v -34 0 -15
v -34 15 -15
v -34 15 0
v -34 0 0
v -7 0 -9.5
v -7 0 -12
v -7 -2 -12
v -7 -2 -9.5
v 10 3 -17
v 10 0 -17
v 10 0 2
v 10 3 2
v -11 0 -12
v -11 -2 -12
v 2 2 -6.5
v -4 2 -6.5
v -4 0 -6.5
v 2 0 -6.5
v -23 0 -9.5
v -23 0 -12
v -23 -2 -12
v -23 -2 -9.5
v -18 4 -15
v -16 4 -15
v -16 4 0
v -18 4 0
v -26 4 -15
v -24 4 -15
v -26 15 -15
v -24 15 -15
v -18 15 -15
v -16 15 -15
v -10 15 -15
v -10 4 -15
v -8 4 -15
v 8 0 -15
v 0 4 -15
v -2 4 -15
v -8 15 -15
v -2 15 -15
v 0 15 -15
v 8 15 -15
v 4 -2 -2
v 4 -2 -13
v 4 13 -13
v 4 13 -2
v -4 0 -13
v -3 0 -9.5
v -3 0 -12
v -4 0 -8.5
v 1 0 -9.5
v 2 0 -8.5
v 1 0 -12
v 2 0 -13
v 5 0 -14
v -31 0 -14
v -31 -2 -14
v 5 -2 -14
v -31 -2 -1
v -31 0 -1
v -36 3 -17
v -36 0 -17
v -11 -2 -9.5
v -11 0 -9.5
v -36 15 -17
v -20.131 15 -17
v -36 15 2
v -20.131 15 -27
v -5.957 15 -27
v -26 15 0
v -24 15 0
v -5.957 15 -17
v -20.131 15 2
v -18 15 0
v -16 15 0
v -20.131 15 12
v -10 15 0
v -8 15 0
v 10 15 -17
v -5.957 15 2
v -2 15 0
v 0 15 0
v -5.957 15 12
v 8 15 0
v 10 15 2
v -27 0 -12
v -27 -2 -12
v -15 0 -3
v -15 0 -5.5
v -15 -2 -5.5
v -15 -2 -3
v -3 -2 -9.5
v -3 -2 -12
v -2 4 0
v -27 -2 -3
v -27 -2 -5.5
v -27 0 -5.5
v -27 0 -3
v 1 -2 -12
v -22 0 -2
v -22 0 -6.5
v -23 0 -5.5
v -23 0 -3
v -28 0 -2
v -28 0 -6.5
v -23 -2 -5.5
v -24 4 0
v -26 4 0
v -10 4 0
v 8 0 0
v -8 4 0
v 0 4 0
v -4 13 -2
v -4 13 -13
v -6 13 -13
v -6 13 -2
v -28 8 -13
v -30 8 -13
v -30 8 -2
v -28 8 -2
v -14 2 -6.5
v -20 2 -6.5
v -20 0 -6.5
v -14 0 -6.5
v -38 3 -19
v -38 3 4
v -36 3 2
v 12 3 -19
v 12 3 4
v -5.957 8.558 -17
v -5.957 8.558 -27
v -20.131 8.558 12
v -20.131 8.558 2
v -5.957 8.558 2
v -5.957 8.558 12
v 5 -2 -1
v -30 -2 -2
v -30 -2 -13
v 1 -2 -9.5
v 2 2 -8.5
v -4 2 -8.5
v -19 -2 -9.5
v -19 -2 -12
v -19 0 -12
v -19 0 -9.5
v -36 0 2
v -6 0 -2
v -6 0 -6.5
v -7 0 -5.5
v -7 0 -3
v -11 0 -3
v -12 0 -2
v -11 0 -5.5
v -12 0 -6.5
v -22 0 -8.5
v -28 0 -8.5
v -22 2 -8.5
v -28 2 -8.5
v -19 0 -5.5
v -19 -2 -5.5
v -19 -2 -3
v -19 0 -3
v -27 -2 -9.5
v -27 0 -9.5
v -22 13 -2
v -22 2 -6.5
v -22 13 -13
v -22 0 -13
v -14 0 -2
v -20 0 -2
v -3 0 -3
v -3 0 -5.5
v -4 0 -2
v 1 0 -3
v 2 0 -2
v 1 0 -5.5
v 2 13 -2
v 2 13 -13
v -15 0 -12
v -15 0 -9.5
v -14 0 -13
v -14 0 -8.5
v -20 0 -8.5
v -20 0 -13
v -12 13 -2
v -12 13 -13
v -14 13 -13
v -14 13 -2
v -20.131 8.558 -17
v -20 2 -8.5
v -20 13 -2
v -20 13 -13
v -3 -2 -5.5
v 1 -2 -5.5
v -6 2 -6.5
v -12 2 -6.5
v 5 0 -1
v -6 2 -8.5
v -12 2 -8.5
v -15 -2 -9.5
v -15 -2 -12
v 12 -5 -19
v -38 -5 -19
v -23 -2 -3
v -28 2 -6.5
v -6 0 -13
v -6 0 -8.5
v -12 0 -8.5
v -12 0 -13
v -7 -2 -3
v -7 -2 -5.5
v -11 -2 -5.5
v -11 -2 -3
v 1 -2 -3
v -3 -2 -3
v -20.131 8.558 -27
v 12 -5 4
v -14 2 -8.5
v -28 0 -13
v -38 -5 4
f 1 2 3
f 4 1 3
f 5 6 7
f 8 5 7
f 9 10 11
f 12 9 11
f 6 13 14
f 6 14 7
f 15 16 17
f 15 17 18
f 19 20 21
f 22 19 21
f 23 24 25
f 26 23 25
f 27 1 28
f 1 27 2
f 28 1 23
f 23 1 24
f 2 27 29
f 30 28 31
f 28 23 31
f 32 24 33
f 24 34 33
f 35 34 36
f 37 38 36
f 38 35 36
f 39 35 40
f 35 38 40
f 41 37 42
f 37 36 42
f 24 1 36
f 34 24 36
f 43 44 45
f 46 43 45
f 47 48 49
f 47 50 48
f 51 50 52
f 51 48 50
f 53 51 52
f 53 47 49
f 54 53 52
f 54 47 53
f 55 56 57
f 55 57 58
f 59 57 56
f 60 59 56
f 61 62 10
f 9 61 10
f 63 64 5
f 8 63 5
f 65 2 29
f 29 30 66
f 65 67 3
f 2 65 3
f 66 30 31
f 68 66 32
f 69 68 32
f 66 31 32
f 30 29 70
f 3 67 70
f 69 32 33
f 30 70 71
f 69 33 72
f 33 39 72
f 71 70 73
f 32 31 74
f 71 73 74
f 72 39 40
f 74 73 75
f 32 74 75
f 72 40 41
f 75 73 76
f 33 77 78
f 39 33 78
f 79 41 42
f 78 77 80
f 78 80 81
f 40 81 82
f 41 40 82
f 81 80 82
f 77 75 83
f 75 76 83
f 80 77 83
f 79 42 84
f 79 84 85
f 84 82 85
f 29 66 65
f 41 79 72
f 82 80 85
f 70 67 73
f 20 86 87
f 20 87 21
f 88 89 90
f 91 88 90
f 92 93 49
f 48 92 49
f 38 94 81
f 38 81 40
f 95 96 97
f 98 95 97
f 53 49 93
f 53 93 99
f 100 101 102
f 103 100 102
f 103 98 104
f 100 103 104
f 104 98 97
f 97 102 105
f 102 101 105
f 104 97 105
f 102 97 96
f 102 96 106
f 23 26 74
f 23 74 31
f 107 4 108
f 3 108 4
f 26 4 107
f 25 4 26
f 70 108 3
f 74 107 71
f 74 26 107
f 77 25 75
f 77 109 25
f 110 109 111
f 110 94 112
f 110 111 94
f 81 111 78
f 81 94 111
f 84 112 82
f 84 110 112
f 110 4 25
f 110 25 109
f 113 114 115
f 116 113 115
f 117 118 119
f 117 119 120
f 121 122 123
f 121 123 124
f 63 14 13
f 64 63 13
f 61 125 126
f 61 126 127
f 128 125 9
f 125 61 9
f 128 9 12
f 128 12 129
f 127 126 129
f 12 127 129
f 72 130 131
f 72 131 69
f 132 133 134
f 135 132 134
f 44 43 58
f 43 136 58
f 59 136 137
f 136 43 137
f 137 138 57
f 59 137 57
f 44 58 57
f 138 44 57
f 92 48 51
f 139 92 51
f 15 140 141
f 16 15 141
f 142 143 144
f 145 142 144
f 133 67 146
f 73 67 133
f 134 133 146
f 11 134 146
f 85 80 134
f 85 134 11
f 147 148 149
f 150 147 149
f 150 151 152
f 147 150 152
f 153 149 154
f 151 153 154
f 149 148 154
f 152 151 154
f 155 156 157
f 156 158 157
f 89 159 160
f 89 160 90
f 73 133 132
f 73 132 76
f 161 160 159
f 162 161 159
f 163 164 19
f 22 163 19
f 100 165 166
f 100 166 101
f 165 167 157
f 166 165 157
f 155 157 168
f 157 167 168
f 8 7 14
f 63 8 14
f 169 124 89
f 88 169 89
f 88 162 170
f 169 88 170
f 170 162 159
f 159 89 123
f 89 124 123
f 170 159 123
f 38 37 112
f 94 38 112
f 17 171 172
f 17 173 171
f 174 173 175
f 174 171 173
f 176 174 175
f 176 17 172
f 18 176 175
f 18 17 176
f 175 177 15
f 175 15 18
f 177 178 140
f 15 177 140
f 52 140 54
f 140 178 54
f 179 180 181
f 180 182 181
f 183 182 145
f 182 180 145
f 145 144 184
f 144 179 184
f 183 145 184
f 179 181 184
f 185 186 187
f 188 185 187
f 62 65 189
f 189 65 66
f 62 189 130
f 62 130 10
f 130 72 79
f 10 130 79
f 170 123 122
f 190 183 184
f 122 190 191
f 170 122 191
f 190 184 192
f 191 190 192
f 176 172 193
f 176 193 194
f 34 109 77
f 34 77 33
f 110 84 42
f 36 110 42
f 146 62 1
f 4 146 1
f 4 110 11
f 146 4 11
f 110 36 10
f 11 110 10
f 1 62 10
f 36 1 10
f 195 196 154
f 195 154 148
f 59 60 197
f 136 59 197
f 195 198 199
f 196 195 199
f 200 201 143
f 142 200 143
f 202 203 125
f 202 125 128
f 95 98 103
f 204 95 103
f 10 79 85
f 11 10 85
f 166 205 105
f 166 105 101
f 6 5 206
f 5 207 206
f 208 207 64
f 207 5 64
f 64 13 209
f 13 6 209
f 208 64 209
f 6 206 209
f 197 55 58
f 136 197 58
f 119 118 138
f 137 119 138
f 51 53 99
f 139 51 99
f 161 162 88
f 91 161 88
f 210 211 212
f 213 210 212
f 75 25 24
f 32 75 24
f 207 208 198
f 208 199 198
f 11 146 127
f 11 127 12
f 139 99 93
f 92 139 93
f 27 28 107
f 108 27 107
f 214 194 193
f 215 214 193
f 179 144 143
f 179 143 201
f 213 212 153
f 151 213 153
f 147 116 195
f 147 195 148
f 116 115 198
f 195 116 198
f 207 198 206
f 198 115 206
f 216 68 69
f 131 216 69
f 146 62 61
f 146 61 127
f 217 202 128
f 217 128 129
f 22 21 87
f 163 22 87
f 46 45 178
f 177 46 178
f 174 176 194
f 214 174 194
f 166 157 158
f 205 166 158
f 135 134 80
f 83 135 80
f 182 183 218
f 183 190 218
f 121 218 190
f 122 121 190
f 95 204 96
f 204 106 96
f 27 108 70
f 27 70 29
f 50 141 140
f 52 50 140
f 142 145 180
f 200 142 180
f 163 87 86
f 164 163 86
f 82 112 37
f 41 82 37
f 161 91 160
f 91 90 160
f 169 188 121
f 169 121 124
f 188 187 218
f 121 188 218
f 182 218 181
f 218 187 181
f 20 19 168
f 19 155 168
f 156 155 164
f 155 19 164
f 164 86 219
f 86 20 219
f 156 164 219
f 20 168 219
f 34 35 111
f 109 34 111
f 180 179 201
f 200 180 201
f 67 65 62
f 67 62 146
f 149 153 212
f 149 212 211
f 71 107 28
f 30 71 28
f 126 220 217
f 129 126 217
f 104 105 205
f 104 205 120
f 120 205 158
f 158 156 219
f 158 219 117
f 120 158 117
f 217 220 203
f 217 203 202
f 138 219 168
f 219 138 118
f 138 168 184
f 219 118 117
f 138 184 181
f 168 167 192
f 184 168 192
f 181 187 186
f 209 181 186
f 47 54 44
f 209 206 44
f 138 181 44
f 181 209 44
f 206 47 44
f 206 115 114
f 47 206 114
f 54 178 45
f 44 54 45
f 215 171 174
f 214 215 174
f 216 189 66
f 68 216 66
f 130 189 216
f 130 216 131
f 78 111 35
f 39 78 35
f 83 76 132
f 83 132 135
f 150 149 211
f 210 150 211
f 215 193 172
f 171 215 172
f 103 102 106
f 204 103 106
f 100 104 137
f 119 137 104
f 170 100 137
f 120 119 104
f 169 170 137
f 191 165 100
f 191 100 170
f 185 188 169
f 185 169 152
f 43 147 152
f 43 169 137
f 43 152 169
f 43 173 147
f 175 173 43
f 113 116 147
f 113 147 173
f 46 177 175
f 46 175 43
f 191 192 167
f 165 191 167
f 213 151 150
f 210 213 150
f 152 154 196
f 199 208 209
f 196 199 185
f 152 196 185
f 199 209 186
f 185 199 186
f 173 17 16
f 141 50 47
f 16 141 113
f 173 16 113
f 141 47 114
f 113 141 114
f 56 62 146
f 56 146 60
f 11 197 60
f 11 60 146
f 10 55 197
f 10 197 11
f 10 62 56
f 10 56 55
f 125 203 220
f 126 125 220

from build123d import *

# Parameters (mm, degrees)
SKETCH1_W                 = 6
SKETCH1_H                 = 15
BOSS_EXTRUDE1_DEPTH       = 15
SKETCH2_W                 = 2
SKETCH2_H                 = 11
CUT_EXTRUDE1_DEPTH        = 13
SKETCH3_W                 = 15
SKETCH3_H                 = 4
BOSS_EXTRUDE2_DEPTH       = 2
LPATTERN1_COUNT           = 5
LPATTERN1_PITCH           = 8
SKETCH6_W                 = 15
SKETCH6_H                 = 15
BOSS_EXTRUDE4_DEPTH       = 2
SKETCH8_W                 = 15
SKETCH8_H                 = 11
BOSS_EXTRUDE5_DEPTH       = 2
SKETCH9_W                 = 34
SKETCH9_H                 = 2
CUT_EXTRUDE2_DEPTH        = 2
SKETCH13_W                = 36
SKETCH13_H                = 13
SKETCH13_W_2              = 34
SKETCH13_H_2              = 11
BOSS_EXTRUDE9_DEPTH       = 2
SKETCH15_W                = 4
SKETCH15_H                = 2.5
BOSS_EXTRUDE10_DEPTH      = 2
LPATTERN2_COUNT           = 4
LPATTERN2_PITCH           = 8
BOSS_EXTRUDE11_DEPTH      = 5
BOSS_EXTRUDE11_DEPTH_BACK = 15
SKETCH17_W                = 46
SKETCH17_H                = 19
SPLIT2_START              = -5
SPLIT2_OUTLINE_W          = 46
SPLIT2_OUTLINE_H          = 19
SPLIT2_DEPTH              = 5
SPLIT2_2_OUTLINE_W        = 2
SPLIT2_2_OUTLINE_H        = 11
SPLIT2_2_DEPTH            = 13
SPLIT2_3_OUTLINE_W        = 6
SPLIT2_3_OUTLINE_H        = 2
SPLIT2_3_DEPTH            = 2
SPLIT2_START_2            = -13
SPLIT2_4_DEPTH            = 11
SPLIT2_START_3            = -17
SPLIT2_5_DEPTH            = 19
SPLIT2_6_OUTLINE_W        = 36
SPLIT2_6_OUTLINE_H        = 2
SPLIT2_6_DEPTH            = 3
SPLIT2_START_4            = -1
SPLIT2_7_OUTLINE_W        = 36
SPLIT2_7_OUTLINE_H        = 2
SPLIT2_7_DEPTH            = 3
SPLIT2_START_5            = -8.5
SPLIT2_8_DEPTH            = 2
SPLIT2_START_6            = -9.5
SPLIT2_9_OUTLINE_W        = 4
SPLIT2_9_OUTLINE_H        = 2
SPLIT2_9_DEPTH            = 4
SPLIT2_10_OUTLINE_W       = 4
SPLIT2_10_OUTLINE_H       = 2
SPLIT2_10_DEPTH           = 1
SPLIT2_START_7            = -3
SPLIT2_11_OUTLINE_W       = 4
SPLIT2_11_OUTLINE_H       = 2
SPLIT2_11_DEPTH           = 1
SKETCH18_W                = 14.174743238
SKETCH18_H                = 6.442150942
BOSS_EXTRUDE12_DEPTH      = 10
SKETCH19_W                = 50
SKETCH19_H                = 23
SKETCH19_W_2              = 46
SKETCH19_H_2              = 19
BOSS_EXTRUDE13_DEPTH      = 8
SKETCH20_W                = 2
SKETCH20_H                = 11
CUT_EXTRUDE3_DEPTH        = 5


# Read off the part's stored shape, not the designer's step: Split2
with BuildPart() as part:
    # Sketch1 → Boss-Extrude1 (new body)
    with BuildSketch(Plane(origin=(0, 0, 0), x_dir=(1, 0, 0), z_dir=(0, 1, 0))):
        with Locations((3, 7.5)):
            Rectangle(SKETCH1_W, SKETCH1_H)
    extrude(amount=BOSS_EXTRUDE1_DEPTH)

    # Sketch2 → Cut-Extrude1 (cut)
    with BuildSketch(Plane.XZ):
        with Locations((3, -7.5)):
            Rectangle(SKETCH2_W, SKETCH2_H)
    extrude(amount=-CUT_EXTRUDE1_DEPTH, mode=Mode.SUBTRACT)

    # Sketch3 → Boss-Extrude2 (add)
    with BuildSketch(Plane.ZY):
        with Locations((-7.5, 2)):
            Rectangle(SKETCH3_W, SKETCH3_H)
    extrude(amount=BOSS_EXTRUDE2_DEPTH)


with BuildPart() as lpattern1_1:
    # LPattern1: pattern copy
    add(part.part.moved(Location(Vector(-1, 0, 0) * (1 * LPATTERN1_PITCH))))


with BuildPart() as lpattern1_2:
    # LPattern1: pattern copy
    add(part.part.moved(Location(Vector(-1, 0, 0) * (2 * LPATTERN1_PITCH))))


with BuildPart() as lpattern1_3:
    # LPattern1: pattern copy
    add(part.part.moved(Location(Vector(-1, 0, 0) * (3 * LPATTERN1_PITCH))))


with BuildPart() as lpattern1_4:
    # LPattern1: pattern copy
    add(part.part.moved(Location(Vector(-1, 0, 0) * (4 * LPATTERN1_PITCH))))


with BuildPart() as lpattern1_1_1:
    add(lpattern1_1.part)

    # Combine1: union LPattern1_2, LPattern1_3, part, LPattern1_4
    add(lpattern1_2.part)
    add(lpattern1_3.part)
    add(part.part)
    add(lpattern1_4.part)

    # Sketch6 → Boss-Extrude4 (add)
    with BuildSketch(Plane(origin=(6, 0, 0), x_dir=(0, 0, -1), z_dir=(1, 0, 0))):
        with Locations((7.5, 7.5)):
            Rectangle(SKETCH6_W, SKETCH6_H)
    extrude(amount=BOSS_EXTRUDE4_DEPTH)

    # Sketch8 → Boss-Extrude5 (add)
    with BuildSketch(Plane.ZY.offset(32)):
        with Locations((-7.5, 9.5)):
            Rectangle(SKETCH8_W, SKETCH8_H)
    extrude(amount=BOSS_EXTRUDE5_DEPTH)

    # Sketch9 → Cut-Extrude2 (cut)
    with BuildSketch(Plane.XZ):
        with Locations((-13, -7.5)):
            Rectangle(SKETCH9_W, SKETCH9_H)
    extrude(amount=-CUT_EXTRUDE2_DEPTH, mode=Mode.SUBTRACT)

    # Sketch13 → Boss-Extrude9 (add)
    with BuildSketch(Plane(origin=(0, 0, 0), x_dir=(-1, 0, 0), z_dir=(0, -1, 0))):
        with Locations((13, 7.5)):
            Rectangle(SKETCH13_W, SKETCH13_H)
        with Locations((13, 7.5)):
            Rectangle(SKETCH13_W_2, SKETCH13_H_2, mode=Mode.SUBTRACT)
    extrude(amount=BOSS_EXTRUDE9_DEPTH)

    # Sketch15 → Boss-Extrude10 (add)
    with BuildSketch(Plane(origin=(0, 0, 0), x_dir=(-1, 0, 0), z_dir=(0, -1, 0))):
        with Locations((25, 4.25)):
            Rectangle(SKETCH15_W, SKETCH15_H)
        with Locations((25, 10.75)):
            Rectangle(SKETCH15_W, SKETCH15_H)
    boss_extrude10 = extrude(amount=BOSS_EXTRUDE10_DEPTH)

    # LPattern2: Boss-Extrude10 ×4
    with Locations(*[(i * LPATTERN2_PITCH, 0, 0) for i in range(1, LPATTERN2_COUNT)]):
        add(boss_extrude10)


with BuildPart() as body_2:
    # Sketch17 → Boss-Extrude11 (new, two sides: drawn at the far end of the back side and taken through both)
    with BuildSketch(Plane.XZ.offset(-BOSS_EXTRUDE11_DEPTH_BACK)):
        with Locations((-13, -7.5)):
            Rectangle(SKETCH17_W, SKETCH17_H)
    extrude(amount=BOSS_EXTRUDE11_DEPTH + BOSS_EXTRUDE11_DEPTH_BACK)

    # Combine3: cut LPattern1_1
    add(lpattern1_1_1.part, mode=Mode.SUBTRACT)

    # Split2 outline → Split2 (cut)
    with BuildSketch(Plane(origin=(0, 0, 0), x_dir=(1, 0, 0), z_dir=(0, 1, 0)).offset(SPLIT2_START)):
        with Locations((-13, 7.5)):
            Rectangle(SPLIT2_OUTLINE_W, SPLIT2_OUTLINE_H)
    extrude(amount=SPLIT2_DEPTH, mode=Mode.SUBTRACT)

    # Split2 2 outline → Split2 2 (cut)
    with BuildSketch(Plane(origin=(0, 0, 0), x_dir=(1, 0, 0), z_dir=(0, 1, 0))):
        with Locations((3, 7.5)):
            Rectangle(SPLIT2_2_OUTLINE_W, SPLIT2_2_OUTLINE_H)
        with Locations((-5, 7.5)):
            Rectangle(SPLIT2_2_OUTLINE_W, SPLIT2_2_OUTLINE_H)
        with Locations((-13, 7.5)):
            Rectangle(SPLIT2_2_OUTLINE_W, SPLIT2_2_OUTLINE_H)
        with Locations((-21, 7.5)):
            Rectangle(SPLIT2_2_OUTLINE_W, SPLIT2_2_OUTLINE_H)
        with Locations((-29, 7.5)):
            Rectangle(SPLIT2_2_OUTLINE_W, SPLIT2_2_OUTLINE_H)
    extrude(amount=SPLIT2_2_DEPTH, mode=Mode.SUBTRACT)

    # Split2 3 outline → Split2 3 (cut)
    with BuildSketch(Plane(origin=(0, 0, 0), x_dir=(1, 0, 0), z_dir=(0, 1, 0))):
        with Locations((-1, 7.5)):
            Rectangle(SPLIT2_3_OUTLINE_W, SPLIT2_3_OUTLINE_H)
        with Locations((-9, 7.5)):
            Rectangle(SPLIT2_3_OUTLINE_W, SPLIT2_3_OUTLINE_H)
        with Locations((-17, 7.5)):
            Rectangle(SPLIT2_3_OUTLINE_W, SPLIT2_3_OUTLINE_H)
        with Locations((-25, 7.5)):
            Rectangle(SPLIT2_3_OUTLINE_W, SPLIT2_3_OUTLINE_H)
    extrude(amount=SPLIT2_3_DEPTH, mode=Mode.SUBTRACT)

    # Sketch18 → Boss-Extrude12 (add)
    with BuildSketch(Plane.XY.offset(2)):
        with Locations((-13.043964225, 11.778924529)):
            Rectangle(SKETCH18_W, SKETCH18_H)
    boss_extrude12 = extrude(amount=BOSS_EXTRUDE12_DEPTH)

    # Mirror2: Boss-Extrude12 across plane
    add(boss_extrude12.mirror(Plane.XY.offset(-7.5)))


with BuildPart() as body_2_2:
    # Split2 4 outline → Split2 4 (new body)
    with BuildSketch(Plane.XY.offset(SPLIT2_START_2)):
        Polygon((-4, 0), (-4, 13), (-6, 13), (-6, 0), (-7, 0), (-7, -2), (-11, -2), (-11, 0), (-12, 0), (-12, 13), (-14, 13), (-14, 0), (-15, 0), (-15, -2), (-19, -2), (-19, 0), (-20, 0), (-20, 13), (-22, 13), (-22, 0), (-23, 0), (-23, -2), (-27, -2), (-27, 0), (-28, 0), (-28, 13), (-30, 13), (-30, -2), (-31, -2), (-31, 0), (-36, 0), (-36, -5), (10, -5), (10, 0), (5, 0), (5, -2), (4, -2), (4, 13), (2, 13), (2, 0), (1, 0), (1, -2), (-3, -2), (-3, 0), align=None)
    extrude(amount=SPLIT2_4_DEPTH)

    # Split2 5 outline → Split2 5 (add)
    with BuildSketch(Plane.XY.offset(SPLIT2_START_3)):
        Polygon((5, -2), (-31, -2), (-31, 0), (-36, 0), (-36, -5), (10, -5), (10, 0), (5, 0), align=None)
    extrude(amount=SPLIT2_5_DEPTH)

    # Split2 6 outline → Split2 6 (add)
    with BuildSketch(Plane.XY.offset(SPLIT2_START_3)):
        with Locations((-13, -1)):
            Rectangle(SPLIT2_6_OUTLINE_W, SPLIT2_6_OUTLINE_H)
    extrude(amount=SPLIT2_6_DEPTH)

    # Split2 7 outline → Split2 7 (add)
    with BuildSketch(Plane.XY.offset(SPLIT2_START_4)):
        with Locations((-13, -1)):
            Rectangle(SPLIT2_7_OUTLINE_W, SPLIT2_7_OUTLINE_H)
    extrude(amount=SPLIT2_7_DEPTH)

    # Split2 8 outline → Split2 8 (add)
    with BuildSketch(Plane.XY.offset(SPLIT2_START_5)):
        Polygon((2, 2), (-4, 2), (-4, 0), (-3, 0), (-3, -2), (1, -2), (1, 0), (2, 0), align=None)
        Polygon((-7, 0), (-6, 0), (-6, 2), (-12, 2), (-12, 0), (-11, 0), (-11, -2), (-7, -2), align=None)
        Polygon((-19, -2), (-15, -2), (-15, 0), (-14, 0), (-14, 2), (-20, 2), (-20, 0), (-19, 0), align=None)
        Polygon((-27, -2), (-23, -2), (-23, 0), (-22, 0), (-22, 2), (-28, 2), (-28, 0), (-27, 0), align=None)
    extrude(amount=SPLIT2_8_DEPTH)

    # Split2 9 outline → Split2 9 (add)
    with BuildSketch(Plane.XY.offset(SPLIT2_START_6)):
        with Locations((-1, -1)):
            Rectangle(SPLIT2_9_OUTLINE_W, SPLIT2_9_OUTLINE_H)
        with Locations((-9, -1)):
            Rectangle(SPLIT2_9_OUTLINE_W, SPLIT2_9_OUTLINE_H)
        with Locations((-17, -1)):
            Rectangle(SPLIT2_9_OUTLINE_W, SPLIT2_9_OUTLINE_H)
        with Locations((-25, -1)):
            Rectangle(SPLIT2_9_OUTLINE_W, SPLIT2_9_OUTLINE_H)
    extrude(amount=SPLIT2_9_DEPTH)

    # Split2 10 outline → Split2 10 (add)
    with BuildSketch(Plane.XY.offset(SPLIT2_START_2)):
        with Locations((-1, -1)):
            Rectangle(SPLIT2_10_OUTLINE_W, SPLIT2_10_OUTLINE_H)
        with Locations((-9, -1)):
            Rectangle(SPLIT2_10_OUTLINE_W, SPLIT2_10_OUTLINE_H)
        with Locations((-17, -1)):
            Rectangle(SPLIT2_10_OUTLINE_W, SPLIT2_10_OUTLINE_H)
        with Locations((-25, -1)):
            Rectangle(SPLIT2_10_OUTLINE_W, SPLIT2_10_OUTLINE_H)
    extrude(amount=SPLIT2_10_DEPTH)

    # Split2 11 outline → Split2 11 (add)
    with BuildSketch(Plane.XY.offset(SPLIT2_START_7)):
        with Locations((-1, -1)):
            Rectangle(SPLIT2_11_OUTLINE_W, SPLIT2_11_OUTLINE_H)
        with Locations((-9, -1)):
            Rectangle(SPLIT2_11_OUTLINE_W, SPLIT2_11_OUTLINE_H)
        with Locations((-17, -1)):
            Rectangle(SPLIT2_11_OUTLINE_W, SPLIT2_11_OUTLINE_H)
        with Locations((-25, -1)):
            Rectangle(SPLIT2_11_OUTLINE_W, SPLIT2_11_OUTLINE_H)
    extrude(amount=SPLIT2_11_DEPTH)

    # Sketch19 → Boss-Extrude13 (add)
    with BuildSketch(Plane.XZ.offset(5)):
        with Locations((-13, -7.5)):
            Rectangle(SKETCH19_W, SKETCH19_H)
        with Locations((-13, -7.5)):
            Rectangle(SKETCH19_W_2, SKETCH19_H_2, mode=Mode.SUBTRACT)
    extrude(amount=-BOSS_EXTRUDE13_DEPTH)

    # Sketch20 → Cut-Extrude3 (cut)
    with BuildSketch(Plane(origin=(0, 13, 0), x_dir=(1, 0, 0), z_dir=(0, 1, 0))):
        with Locations((-29, 7.5)):
            Rectangle(SKETCH20_W, SKETCH20_H)
    extrude(amount=-CUT_EXTRUDE3_DEPTH, mode=Mode.SUBTRACT)


solid = Compound([body_2.part, body_2_2.part])
